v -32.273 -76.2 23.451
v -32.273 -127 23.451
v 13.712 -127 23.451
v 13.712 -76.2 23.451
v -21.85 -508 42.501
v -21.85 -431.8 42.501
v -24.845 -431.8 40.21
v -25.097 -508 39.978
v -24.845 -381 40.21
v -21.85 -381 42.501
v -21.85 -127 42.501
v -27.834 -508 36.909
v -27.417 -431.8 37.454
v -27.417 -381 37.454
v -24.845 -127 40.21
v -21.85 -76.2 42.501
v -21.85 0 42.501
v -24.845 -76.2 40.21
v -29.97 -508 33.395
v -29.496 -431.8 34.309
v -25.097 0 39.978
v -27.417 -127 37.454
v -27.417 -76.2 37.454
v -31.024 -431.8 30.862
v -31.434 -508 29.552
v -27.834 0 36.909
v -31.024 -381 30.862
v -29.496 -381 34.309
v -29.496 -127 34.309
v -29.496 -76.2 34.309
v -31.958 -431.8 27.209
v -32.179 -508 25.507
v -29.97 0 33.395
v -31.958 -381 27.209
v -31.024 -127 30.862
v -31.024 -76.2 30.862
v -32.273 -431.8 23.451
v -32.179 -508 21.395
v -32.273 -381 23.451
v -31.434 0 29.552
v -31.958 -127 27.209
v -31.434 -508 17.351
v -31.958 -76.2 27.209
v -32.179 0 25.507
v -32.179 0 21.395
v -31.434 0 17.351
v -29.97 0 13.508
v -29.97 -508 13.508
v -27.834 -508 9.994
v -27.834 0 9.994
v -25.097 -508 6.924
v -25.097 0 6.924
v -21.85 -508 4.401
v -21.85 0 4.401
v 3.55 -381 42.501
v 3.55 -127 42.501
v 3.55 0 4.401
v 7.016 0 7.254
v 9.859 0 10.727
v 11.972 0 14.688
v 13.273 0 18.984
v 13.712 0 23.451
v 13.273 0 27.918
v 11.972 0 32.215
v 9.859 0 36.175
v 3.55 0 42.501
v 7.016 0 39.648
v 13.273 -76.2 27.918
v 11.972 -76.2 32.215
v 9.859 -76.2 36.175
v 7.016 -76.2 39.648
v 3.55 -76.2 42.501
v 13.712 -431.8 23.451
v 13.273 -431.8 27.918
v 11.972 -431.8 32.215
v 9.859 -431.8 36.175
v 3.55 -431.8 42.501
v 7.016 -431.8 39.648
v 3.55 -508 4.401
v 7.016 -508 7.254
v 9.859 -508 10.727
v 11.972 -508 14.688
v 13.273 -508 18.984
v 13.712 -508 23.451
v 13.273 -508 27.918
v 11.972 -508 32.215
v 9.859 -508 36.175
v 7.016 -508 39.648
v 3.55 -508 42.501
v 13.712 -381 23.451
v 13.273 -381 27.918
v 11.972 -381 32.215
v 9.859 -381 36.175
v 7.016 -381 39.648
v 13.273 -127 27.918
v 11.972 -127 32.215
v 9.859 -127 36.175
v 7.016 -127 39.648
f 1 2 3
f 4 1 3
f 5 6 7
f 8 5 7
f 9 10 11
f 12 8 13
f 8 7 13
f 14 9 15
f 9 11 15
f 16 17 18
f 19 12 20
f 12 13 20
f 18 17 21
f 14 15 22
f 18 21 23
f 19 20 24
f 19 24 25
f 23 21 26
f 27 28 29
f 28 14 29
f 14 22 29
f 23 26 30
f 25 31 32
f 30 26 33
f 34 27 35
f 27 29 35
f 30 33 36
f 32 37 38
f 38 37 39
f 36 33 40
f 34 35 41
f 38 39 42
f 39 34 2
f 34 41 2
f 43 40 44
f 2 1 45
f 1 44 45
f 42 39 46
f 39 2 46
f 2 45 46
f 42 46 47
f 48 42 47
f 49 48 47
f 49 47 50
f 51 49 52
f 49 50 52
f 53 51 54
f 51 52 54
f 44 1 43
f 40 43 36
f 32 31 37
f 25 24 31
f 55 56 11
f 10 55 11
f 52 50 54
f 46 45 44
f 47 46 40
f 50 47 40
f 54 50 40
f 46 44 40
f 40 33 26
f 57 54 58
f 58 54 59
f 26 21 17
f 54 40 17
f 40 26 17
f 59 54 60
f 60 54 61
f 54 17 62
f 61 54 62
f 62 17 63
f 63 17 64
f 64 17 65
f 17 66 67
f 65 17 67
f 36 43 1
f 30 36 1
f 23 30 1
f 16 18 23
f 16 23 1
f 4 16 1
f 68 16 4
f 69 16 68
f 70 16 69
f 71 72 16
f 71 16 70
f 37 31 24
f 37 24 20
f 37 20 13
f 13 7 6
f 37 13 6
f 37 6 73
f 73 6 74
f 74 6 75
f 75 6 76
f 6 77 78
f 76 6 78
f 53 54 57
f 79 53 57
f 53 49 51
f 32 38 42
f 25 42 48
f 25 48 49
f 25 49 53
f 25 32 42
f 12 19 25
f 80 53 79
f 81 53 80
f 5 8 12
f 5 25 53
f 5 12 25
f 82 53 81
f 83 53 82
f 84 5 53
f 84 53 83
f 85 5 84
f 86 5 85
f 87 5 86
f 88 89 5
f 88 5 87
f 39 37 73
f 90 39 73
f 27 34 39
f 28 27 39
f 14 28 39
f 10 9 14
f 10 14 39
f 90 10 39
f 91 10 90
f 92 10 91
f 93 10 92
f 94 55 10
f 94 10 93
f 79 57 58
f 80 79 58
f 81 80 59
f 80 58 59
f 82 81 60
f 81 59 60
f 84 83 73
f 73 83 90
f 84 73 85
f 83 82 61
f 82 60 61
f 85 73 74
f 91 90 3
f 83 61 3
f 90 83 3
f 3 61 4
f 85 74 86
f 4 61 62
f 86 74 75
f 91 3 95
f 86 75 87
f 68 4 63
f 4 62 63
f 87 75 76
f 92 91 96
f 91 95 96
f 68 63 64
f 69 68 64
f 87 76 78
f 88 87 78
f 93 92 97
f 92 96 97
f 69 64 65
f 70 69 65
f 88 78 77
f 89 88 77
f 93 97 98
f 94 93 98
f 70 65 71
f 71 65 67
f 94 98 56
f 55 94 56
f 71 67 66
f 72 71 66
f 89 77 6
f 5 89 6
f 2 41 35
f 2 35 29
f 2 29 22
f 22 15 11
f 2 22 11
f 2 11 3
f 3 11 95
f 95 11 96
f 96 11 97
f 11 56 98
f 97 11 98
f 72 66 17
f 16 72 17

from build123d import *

# Parameters (mm, degrees)
F1_DEPTH = 508
F2_W     = 80.340108
F2_H     = 50.8
F2_W_2   = 82.870346
F3_DEPTH = 19.05


with BuildPart() as f1:
    # F0 (on Front) → F1 (new body)
    with BuildSketch(Plane.XZ):
        with BuildLine():
            Line((3.550242, 42.501207), (-21.849758, 42.501207))
            ThreePointArc((-21.849758, 42.501207), (-32.272509, 23.451207), (-21.849758, 4.401207))
            Line((-21.849758, 4.401207), (3.550242, 4.401207))
            ThreePointArc((3.550242, 4.401207), (13.712078, 23.451207), (3.550242, 42.501207))
        make_face()
    extrude(amount=F1_DEPTH)

    # F2 (on face) → F3 (cut)
    with BuildSketch(Plane.XY.offset(42.501207)):
        with Locations((-9.149758, -406.4)):
            Rectangle(F2_W, F2_H)
        with Locations((-9.149758, -101.6)):
            Rectangle(F2_W_2, F2_H)
    extrude(amount=-F3_DEPTH, mode=Mode.SUBTRACT)


solid = f1.part
